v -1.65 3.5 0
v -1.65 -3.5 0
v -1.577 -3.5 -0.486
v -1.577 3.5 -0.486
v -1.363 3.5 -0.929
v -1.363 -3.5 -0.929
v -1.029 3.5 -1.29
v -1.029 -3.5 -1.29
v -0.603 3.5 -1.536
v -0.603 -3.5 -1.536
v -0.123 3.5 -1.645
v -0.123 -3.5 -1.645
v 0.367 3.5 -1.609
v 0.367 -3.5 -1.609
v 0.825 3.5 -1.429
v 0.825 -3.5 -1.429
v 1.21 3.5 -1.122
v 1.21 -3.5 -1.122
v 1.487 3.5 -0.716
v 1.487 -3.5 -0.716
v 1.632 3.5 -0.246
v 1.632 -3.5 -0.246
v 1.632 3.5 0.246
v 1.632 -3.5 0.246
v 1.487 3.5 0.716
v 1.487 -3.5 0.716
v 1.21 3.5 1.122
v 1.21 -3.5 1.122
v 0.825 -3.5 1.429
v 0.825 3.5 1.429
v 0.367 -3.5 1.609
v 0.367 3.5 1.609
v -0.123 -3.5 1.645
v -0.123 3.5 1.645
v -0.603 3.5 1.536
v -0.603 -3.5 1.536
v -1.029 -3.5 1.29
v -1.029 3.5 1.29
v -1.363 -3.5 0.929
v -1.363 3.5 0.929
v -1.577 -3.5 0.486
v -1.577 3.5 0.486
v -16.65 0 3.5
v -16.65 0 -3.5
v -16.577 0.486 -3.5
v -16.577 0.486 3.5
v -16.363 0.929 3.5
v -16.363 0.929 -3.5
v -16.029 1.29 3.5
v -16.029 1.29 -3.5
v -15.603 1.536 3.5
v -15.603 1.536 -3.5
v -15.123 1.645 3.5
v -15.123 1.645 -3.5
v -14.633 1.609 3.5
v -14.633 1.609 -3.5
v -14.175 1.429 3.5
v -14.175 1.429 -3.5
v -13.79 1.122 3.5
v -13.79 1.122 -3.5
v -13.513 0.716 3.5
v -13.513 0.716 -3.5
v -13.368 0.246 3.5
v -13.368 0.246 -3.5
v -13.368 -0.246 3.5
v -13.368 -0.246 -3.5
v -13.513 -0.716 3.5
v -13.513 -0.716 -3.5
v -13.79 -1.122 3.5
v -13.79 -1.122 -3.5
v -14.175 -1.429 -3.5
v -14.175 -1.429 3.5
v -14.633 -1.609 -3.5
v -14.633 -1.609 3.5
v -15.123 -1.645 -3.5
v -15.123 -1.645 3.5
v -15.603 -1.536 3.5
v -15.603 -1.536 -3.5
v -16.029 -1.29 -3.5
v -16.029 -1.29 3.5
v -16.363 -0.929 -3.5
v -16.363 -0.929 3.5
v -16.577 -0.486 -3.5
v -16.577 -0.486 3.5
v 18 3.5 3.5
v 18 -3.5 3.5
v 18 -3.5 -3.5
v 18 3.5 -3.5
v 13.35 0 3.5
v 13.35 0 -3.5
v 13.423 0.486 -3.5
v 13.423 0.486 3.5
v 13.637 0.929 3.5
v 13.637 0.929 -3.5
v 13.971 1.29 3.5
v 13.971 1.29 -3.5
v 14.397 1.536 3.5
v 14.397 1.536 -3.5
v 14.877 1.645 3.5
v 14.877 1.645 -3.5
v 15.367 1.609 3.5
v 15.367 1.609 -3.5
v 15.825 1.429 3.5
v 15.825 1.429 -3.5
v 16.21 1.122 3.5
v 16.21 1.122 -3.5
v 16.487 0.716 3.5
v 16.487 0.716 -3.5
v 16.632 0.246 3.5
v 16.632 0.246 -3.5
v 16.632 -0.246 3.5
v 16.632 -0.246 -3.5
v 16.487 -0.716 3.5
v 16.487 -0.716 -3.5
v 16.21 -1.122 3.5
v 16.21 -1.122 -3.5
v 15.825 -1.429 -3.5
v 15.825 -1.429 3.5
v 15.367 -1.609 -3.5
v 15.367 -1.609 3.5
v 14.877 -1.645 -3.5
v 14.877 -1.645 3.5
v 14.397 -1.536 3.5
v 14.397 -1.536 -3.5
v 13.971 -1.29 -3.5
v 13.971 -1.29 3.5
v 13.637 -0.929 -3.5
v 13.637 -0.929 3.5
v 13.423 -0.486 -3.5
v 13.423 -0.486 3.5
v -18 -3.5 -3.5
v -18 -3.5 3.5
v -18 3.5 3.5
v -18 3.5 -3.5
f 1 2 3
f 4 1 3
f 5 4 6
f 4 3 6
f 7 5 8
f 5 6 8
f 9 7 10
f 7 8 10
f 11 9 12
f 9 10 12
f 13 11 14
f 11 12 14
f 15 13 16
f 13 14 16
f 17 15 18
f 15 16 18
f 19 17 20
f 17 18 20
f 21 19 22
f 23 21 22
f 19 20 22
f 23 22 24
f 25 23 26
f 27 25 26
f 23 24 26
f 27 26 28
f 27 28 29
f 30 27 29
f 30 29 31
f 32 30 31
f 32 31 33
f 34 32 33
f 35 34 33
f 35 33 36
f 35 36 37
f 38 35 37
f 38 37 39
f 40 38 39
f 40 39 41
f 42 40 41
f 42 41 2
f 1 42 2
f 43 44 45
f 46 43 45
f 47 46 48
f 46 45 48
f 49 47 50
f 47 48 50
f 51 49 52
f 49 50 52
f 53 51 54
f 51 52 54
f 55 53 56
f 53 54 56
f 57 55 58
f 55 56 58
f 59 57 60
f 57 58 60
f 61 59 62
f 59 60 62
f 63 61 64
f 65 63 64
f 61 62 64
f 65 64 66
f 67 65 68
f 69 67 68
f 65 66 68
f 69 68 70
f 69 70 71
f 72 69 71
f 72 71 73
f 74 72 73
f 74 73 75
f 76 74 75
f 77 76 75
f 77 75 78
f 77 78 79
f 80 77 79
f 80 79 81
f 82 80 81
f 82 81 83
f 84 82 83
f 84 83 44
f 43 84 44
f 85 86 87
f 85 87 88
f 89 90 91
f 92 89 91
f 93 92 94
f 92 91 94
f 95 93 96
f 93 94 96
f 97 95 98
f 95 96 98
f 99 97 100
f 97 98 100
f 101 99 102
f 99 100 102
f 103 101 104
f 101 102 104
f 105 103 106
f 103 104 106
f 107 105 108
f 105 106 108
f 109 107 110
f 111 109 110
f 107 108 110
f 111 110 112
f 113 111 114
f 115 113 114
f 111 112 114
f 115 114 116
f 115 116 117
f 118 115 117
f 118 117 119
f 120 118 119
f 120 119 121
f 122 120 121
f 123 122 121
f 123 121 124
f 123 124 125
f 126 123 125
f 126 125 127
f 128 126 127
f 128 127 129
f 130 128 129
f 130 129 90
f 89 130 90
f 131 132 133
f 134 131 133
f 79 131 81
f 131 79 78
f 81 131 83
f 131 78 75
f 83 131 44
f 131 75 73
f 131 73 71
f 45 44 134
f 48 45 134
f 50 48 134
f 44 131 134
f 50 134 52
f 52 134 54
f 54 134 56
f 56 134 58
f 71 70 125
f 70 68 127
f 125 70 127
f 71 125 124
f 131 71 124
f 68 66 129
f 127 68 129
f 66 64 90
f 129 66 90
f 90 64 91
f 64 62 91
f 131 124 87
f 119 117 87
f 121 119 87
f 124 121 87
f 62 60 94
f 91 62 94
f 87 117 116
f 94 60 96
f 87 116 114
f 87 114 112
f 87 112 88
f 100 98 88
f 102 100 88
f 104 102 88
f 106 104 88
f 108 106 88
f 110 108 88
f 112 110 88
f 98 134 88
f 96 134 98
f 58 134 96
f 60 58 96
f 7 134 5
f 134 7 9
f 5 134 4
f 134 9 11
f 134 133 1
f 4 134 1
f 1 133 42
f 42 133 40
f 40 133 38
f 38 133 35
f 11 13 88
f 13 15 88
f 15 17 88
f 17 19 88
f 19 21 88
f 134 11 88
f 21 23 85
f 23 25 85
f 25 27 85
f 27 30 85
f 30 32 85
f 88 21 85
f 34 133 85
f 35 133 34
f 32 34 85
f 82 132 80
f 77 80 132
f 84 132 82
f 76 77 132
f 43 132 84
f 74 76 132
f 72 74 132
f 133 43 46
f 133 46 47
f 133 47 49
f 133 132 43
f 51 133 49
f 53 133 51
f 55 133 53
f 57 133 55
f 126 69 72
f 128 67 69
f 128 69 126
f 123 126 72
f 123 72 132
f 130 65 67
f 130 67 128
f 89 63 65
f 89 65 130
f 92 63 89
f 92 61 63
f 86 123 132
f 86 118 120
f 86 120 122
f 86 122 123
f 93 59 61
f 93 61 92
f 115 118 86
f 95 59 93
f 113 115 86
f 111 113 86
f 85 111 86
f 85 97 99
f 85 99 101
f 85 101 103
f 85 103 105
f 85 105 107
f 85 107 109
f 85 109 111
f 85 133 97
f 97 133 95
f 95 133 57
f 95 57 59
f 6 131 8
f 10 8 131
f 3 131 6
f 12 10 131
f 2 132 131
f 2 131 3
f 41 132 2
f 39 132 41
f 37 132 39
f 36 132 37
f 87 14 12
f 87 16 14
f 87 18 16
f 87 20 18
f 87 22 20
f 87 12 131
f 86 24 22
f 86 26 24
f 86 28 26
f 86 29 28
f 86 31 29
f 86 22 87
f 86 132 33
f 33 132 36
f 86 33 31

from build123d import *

# Parameters (mm, degrees)
SKETCH_1_W             = 36
SKETCH_1_H             = 7
SKETCH_1_R             = 0.5
EXTRUDE_1_DEPTH        = 3.5
HOLE_WIZARD_M4_1_D     = 3.3
HOLE_WIZARD_M4_1_DEPTH = 22.1
HOLE_WIZARD_M4_1_TIP   = 0.991420021
HOLE_WIZARD_M4_2_D     = 3.3
HOLE_WIZARD_M4_2_DEPTH = 22.1
HOLE_WIZARD_M4_2_TIP   = 0.991420021


with BuildPart() as part:
    # 草图1 → 凸台-拉伸1 (new body, symmetric)
    with BuildSketch(Plane.XY):
        Rectangle(SKETCH_1_W, SKETCH_1_H)
        with Locations((-15, 0)):
            Circle(SKETCH_1_R, mode=Mode.SUBTRACT)
        with Locations((15, 0)):
            Circle(SKETCH_1_R, mode=Mode.SUBTRACT)
    extrude(amount=EXTRUDE_1_DEPTH, both=True)

    # M4 螺纹孔1
    with Locations(Plane.XY.offset(3.5)):
        with Locations((-15, 0), (15, 0)):
            Hole(HOLE_WIZARD_M4_1_D / 2, depth=HOLE_WIZARD_M4_1_DEPTH)
            with Locations((0, 0, -(HOLE_WIZARD_M4_1_DEPTH + HOLE_WIZARD_M4_1_TIP / 2))):  # 118° drill point
                Cone(0, HOLE_WIZARD_M4_1_D / 2, HOLE_WIZARD_M4_1_TIP, mode=Mode.SUBTRACT)

    # M4 螺纹孔2
    with Locations(Plane(origin=(0, 3.5, 0), x_dir=(1, 0, 0), z_dir=(0, 1, 0))):
        with Locations((0, 0)):
            Hole(HOLE_WIZARD_M4_2_D / 2, depth=HOLE_WIZARD_M4_2_DEPTH)
            with Locations((0, 0, -(HOLE_WIZARD_M4_2_DEPTH + HOLE_WIZARD_M4_2_TIP / 2))):  # 118° drill point
                Cone(0, HOLE_WIZARD_M4_2_D / 2, HOLE_WIZARD_M4_2_TIP, mode=Mode.SUBTRACT)


solid = part.part
